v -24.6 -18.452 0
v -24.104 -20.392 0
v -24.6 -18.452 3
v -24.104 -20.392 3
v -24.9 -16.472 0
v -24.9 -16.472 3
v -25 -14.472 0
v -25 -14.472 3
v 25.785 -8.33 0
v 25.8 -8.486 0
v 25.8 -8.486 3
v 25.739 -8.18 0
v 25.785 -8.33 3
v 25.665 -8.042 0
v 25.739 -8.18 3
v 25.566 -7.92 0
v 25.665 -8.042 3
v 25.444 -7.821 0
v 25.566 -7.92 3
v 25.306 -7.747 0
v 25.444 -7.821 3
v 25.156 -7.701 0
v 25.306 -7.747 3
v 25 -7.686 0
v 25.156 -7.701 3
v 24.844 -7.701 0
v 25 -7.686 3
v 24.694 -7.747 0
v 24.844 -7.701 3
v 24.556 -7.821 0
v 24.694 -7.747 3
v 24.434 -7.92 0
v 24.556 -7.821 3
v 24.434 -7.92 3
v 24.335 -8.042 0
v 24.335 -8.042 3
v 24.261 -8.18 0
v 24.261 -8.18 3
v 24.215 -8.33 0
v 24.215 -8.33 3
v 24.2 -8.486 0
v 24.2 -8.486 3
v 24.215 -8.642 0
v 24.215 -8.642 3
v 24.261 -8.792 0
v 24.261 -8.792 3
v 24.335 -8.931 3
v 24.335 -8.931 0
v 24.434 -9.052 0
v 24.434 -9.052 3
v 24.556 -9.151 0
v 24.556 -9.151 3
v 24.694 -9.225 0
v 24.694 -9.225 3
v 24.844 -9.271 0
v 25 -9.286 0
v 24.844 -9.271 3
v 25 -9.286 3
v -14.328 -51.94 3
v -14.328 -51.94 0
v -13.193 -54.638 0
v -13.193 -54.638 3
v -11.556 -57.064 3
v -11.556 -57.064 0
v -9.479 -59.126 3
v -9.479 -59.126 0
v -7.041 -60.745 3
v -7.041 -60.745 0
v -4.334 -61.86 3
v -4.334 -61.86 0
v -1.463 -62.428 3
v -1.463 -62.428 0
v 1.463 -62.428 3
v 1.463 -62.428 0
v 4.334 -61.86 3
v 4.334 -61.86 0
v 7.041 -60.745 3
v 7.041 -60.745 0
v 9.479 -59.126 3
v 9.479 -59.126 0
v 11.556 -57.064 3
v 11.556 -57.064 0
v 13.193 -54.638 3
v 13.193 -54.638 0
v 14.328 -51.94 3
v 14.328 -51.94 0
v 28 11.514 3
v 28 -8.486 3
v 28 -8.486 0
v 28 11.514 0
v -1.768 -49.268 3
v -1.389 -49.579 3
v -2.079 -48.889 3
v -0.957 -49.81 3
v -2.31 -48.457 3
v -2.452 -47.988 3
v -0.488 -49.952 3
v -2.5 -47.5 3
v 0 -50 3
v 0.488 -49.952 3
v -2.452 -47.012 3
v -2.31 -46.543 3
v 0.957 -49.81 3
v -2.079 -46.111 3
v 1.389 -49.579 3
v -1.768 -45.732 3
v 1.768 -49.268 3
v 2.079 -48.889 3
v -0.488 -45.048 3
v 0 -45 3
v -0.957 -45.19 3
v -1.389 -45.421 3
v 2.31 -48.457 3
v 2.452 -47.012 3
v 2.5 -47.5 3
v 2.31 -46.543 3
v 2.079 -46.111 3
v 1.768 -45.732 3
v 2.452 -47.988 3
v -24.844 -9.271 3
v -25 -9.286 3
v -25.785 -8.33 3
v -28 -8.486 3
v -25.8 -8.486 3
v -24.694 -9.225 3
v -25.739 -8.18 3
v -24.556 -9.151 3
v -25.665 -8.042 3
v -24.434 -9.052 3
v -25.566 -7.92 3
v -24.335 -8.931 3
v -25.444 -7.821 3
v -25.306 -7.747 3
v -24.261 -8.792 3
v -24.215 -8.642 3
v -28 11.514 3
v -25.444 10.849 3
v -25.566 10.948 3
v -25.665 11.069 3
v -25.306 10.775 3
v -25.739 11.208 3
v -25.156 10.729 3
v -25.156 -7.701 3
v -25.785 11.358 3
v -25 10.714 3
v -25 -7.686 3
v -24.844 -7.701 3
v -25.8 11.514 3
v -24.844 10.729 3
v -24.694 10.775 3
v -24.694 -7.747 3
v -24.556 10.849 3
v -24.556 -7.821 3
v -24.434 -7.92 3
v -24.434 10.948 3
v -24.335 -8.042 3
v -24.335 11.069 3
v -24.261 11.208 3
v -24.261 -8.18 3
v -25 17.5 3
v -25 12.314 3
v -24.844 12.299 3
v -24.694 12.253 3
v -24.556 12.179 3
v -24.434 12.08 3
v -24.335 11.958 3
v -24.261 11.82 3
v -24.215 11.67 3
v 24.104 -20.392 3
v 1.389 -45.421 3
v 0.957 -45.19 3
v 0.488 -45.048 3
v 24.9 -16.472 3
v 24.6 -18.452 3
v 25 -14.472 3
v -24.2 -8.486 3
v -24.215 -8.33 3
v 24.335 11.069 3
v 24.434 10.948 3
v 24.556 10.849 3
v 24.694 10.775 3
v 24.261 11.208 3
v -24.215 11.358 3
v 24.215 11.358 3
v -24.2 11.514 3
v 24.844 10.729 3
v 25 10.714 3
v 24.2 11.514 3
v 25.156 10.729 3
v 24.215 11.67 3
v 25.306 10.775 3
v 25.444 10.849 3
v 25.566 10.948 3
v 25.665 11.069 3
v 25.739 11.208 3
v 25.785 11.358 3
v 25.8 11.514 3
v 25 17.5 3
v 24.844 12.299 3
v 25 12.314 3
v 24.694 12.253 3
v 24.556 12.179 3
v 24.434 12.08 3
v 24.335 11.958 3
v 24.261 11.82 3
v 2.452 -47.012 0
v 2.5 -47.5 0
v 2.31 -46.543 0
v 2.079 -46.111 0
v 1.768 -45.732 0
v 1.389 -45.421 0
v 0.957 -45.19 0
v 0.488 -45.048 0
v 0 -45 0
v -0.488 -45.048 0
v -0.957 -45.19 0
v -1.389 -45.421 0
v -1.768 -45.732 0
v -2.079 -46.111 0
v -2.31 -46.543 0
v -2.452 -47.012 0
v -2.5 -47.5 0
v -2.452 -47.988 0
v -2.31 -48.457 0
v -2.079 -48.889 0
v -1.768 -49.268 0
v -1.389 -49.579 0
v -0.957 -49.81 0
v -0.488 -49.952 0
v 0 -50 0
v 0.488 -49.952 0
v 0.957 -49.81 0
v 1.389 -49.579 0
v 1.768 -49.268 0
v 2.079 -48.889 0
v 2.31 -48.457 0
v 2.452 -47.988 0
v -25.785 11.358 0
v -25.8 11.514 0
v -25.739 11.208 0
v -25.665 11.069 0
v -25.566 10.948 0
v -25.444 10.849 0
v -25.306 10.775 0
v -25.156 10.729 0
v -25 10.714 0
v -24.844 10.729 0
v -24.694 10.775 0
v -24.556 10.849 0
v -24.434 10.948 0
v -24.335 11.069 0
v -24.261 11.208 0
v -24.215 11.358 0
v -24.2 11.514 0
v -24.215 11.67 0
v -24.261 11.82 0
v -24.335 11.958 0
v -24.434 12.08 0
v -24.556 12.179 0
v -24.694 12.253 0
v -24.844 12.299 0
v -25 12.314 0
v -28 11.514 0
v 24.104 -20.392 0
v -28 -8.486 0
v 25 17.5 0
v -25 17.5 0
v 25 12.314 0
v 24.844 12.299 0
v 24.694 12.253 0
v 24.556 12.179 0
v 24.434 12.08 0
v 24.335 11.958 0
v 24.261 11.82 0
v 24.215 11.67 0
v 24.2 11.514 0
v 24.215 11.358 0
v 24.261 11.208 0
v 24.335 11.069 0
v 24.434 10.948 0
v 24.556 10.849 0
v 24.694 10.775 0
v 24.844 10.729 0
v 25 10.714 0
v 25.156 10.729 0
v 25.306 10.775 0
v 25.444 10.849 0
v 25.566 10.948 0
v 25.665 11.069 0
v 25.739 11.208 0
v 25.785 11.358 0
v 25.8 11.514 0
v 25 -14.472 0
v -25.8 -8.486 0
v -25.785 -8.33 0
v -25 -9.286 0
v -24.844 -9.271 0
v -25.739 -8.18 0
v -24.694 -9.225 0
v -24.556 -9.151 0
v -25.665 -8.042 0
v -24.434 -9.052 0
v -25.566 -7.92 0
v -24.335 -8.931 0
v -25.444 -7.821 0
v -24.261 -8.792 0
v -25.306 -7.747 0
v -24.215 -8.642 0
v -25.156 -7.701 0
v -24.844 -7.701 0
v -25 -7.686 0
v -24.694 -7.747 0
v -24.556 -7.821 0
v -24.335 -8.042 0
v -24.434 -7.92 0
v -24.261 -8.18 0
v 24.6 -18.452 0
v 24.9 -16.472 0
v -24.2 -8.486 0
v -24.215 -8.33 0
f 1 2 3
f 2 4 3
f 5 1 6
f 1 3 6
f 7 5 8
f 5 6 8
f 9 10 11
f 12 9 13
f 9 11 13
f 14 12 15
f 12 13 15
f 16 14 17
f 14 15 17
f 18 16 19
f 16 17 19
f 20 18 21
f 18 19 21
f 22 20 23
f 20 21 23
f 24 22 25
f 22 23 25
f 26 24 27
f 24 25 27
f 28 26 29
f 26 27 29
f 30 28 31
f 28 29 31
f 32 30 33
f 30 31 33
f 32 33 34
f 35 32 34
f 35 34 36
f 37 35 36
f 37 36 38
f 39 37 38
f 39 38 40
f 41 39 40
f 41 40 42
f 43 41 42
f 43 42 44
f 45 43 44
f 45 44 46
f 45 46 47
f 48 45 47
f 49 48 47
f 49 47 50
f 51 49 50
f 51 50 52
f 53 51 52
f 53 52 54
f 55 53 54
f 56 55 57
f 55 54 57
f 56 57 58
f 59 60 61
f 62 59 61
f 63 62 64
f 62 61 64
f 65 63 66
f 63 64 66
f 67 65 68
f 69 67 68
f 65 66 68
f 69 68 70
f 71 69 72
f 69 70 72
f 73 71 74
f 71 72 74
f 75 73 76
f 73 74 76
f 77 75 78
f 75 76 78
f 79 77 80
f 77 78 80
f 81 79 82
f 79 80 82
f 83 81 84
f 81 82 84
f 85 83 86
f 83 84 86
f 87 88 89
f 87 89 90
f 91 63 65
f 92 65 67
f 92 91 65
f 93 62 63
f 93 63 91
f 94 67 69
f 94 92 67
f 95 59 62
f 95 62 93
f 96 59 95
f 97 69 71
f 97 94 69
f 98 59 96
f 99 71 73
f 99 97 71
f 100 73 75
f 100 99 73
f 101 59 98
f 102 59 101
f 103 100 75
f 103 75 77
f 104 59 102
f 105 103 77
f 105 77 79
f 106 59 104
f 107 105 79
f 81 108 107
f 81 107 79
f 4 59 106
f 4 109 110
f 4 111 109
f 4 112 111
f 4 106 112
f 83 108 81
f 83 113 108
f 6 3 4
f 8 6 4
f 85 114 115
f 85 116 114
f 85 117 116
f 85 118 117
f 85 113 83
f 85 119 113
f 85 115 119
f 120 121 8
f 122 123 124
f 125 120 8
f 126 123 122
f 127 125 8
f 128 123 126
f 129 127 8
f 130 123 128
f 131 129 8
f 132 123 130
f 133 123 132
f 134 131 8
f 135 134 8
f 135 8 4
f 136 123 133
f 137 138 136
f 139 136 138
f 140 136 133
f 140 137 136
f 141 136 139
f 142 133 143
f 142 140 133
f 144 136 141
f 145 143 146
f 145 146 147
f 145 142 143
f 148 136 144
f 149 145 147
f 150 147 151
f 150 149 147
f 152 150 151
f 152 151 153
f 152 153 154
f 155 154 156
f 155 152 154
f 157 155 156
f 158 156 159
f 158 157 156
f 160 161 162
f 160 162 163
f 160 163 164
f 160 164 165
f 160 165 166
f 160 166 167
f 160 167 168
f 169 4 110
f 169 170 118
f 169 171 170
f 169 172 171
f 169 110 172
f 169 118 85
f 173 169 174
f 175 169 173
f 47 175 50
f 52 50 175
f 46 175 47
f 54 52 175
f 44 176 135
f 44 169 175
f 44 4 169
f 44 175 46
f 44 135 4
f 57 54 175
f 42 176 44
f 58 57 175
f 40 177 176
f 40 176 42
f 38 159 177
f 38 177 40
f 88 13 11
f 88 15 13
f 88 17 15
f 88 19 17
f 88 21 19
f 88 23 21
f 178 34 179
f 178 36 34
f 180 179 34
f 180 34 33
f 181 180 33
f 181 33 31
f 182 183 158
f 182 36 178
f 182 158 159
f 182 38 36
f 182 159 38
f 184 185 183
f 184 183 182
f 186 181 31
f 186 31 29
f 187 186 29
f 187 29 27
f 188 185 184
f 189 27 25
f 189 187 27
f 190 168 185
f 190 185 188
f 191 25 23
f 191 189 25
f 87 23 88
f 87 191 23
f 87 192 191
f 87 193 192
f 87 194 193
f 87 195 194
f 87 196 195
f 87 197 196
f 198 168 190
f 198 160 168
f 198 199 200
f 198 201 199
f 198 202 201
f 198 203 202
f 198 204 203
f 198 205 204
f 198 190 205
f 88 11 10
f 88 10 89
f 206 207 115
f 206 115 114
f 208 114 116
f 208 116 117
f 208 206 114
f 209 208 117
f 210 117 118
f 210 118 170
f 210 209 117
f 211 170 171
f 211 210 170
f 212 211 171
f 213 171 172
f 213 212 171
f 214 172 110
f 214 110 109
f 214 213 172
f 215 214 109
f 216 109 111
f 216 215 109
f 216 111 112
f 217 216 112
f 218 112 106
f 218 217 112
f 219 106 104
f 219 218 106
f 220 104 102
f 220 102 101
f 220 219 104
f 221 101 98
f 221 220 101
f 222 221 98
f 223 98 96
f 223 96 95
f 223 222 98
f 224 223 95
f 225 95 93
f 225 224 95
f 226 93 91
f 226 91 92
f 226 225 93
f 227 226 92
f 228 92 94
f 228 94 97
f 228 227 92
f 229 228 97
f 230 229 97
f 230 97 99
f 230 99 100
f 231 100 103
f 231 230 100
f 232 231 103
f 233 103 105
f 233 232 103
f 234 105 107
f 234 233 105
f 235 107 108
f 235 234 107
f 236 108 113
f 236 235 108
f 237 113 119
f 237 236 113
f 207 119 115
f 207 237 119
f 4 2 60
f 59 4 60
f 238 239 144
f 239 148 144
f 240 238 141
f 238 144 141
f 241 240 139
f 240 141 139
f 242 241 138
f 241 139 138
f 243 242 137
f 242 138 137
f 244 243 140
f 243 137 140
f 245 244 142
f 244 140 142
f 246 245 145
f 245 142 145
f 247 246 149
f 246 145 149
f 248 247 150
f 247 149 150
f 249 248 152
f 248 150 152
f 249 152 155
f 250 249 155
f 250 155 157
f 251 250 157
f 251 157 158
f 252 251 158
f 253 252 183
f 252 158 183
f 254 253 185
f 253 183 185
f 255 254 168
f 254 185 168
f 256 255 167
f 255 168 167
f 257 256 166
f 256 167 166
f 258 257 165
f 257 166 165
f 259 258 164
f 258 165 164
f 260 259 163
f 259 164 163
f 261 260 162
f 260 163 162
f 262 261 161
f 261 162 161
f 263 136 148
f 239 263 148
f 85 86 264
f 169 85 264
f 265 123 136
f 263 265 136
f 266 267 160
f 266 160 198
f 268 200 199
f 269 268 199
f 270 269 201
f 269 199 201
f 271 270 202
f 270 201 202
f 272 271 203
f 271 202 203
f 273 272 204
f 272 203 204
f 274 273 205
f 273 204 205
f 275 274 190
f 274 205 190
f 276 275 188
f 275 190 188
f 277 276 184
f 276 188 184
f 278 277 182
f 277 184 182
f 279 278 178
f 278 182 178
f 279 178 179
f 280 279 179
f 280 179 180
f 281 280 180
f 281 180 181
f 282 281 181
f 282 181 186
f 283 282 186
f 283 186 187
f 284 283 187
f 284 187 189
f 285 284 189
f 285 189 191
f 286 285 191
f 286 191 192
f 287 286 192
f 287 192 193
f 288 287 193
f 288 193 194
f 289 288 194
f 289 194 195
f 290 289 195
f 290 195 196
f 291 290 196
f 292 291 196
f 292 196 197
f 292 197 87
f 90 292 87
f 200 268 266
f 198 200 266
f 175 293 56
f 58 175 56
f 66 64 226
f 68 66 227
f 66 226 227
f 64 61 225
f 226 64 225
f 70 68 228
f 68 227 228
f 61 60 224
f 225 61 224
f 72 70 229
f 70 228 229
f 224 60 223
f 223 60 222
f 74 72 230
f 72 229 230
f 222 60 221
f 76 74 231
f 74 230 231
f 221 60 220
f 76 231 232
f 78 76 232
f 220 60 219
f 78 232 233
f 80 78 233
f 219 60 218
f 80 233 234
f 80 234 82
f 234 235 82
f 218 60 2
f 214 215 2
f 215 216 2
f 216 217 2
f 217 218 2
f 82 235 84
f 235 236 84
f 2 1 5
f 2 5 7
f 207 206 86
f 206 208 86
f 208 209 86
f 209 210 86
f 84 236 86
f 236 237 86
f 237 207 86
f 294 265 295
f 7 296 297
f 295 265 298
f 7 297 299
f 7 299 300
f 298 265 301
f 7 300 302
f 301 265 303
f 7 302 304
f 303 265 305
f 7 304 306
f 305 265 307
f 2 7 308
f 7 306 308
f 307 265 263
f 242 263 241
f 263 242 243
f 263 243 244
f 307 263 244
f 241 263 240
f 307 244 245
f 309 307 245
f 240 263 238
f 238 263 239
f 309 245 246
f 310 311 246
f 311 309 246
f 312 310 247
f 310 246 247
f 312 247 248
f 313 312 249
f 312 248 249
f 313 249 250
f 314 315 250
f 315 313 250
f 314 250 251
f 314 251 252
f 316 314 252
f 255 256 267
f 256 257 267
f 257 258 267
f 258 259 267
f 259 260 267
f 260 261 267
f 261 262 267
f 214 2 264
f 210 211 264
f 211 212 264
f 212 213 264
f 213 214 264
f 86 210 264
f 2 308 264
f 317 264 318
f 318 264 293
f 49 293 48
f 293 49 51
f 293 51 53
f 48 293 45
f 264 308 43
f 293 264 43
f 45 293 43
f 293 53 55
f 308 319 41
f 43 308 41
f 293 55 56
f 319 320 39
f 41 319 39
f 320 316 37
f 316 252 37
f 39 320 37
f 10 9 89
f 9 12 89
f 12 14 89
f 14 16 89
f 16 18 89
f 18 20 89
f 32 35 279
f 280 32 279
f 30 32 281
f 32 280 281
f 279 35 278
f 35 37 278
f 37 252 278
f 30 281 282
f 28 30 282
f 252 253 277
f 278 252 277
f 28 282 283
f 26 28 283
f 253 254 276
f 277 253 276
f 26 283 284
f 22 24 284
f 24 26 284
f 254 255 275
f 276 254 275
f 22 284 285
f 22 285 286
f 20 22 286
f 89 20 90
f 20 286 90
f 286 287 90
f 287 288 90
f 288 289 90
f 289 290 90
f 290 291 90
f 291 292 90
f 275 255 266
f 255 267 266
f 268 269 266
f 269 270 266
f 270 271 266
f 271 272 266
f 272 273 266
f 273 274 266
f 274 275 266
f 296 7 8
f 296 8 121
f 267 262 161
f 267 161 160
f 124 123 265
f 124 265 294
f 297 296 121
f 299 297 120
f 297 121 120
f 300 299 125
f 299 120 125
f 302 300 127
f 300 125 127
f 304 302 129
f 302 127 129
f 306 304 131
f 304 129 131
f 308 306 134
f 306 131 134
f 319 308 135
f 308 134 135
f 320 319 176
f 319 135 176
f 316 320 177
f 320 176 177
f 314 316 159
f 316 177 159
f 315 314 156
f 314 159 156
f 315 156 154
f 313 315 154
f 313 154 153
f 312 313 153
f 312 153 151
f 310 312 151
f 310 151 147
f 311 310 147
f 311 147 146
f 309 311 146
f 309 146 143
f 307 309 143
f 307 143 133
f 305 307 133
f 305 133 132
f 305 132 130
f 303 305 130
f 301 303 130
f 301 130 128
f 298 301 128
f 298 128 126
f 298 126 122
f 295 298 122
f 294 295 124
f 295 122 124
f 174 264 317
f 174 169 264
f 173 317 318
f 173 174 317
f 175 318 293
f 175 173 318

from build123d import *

# Parameters (mm, degrees)
SKETCH1_W           = 50
SKETCH1_H           = 35
SKETCH1_R           = 2.5
BOSS_EXTRUDE1_DEPTH = 3
FILLET1_R           = 20
SKETCH2_W           = 6
SKETCH2_H           = 20
BOSS_EXTRUDE2_DEPTH = 3
SKETCH3_R           = 0.8
CUT_EXTRUDE1_DEPTH  = 69.551075849


with BuildPart() as part:
    # Sketch1 → Boss-Extrude1 (new body)
    # profile 1 of 2: a face of its own
    with BuildSketch(Plane.XY):
        Rectangle(SKETCH1_W, SKETCH1_H)
    # profile 2 of 2: a face of its own
    with BuildSketch(Plane.XY):
        with BuildLine():
            Line((-25, -17.5), (-14.327856223, -51.939880186))
            ThreePointArc((-14.327856223, -51.939880186), (0, -62.5), (14.327856223, -51.939880186))
            Line((14.327856223, -51.939880186), (25, -17.5))
            Line((25, -17.5), (-25, -17.5))
        make_face()
        with Locations((0, -47.5)):
            Circle(SKETCH1_R, mode=Mode.SUBTRACT)
    extrude(amount=BOSS_EXTRUDE1_DEPTH)

    # Fillet1
    fillet1_edges = [part.edges().sort_by_distance(p)[0] for p in [
        (25, -17.5, 1.5),
        (-25, -17.5, 1.5),
    ]]
    fillet(fillet1_edges, radius=FILLET1_R)

    # Sketch2 → Boss-Extrude2 (add)
    with BuildSketch(Plane.XY.offset(3)):
        with Locations((-25, 1.513878189)):
            Rectangle(SKETCH2_W, SKETCH2_H)
        with Locations((25, 1.513878189)):
            Rectangle(SKETCH2_W, SKETCH2_H)
    extrude(amount=-BOSS_EXTRUDE2_DEPTH)

    # Sketch3 → Cut-Extrude1 (cut, through all)
    with BuildSketch(Plane.XY.offset(3)):
        with Locations((-25, 11.513878189)):
            Circle(SKETCH3_R)
        with Locations((-25, -8.486121811)):
            Circle(SKETCH3_R)
        with Locations((25, 11.513878189)):
            Circle(SKETCH3_R)
        with Locations((25, -8.486121811)):
            Circle(SKETCH3_R)
    extrude(amount=-CUT_EXTRUDE1_DEPTH, mode=Mode.SUBTRACT)


solid = part.part
